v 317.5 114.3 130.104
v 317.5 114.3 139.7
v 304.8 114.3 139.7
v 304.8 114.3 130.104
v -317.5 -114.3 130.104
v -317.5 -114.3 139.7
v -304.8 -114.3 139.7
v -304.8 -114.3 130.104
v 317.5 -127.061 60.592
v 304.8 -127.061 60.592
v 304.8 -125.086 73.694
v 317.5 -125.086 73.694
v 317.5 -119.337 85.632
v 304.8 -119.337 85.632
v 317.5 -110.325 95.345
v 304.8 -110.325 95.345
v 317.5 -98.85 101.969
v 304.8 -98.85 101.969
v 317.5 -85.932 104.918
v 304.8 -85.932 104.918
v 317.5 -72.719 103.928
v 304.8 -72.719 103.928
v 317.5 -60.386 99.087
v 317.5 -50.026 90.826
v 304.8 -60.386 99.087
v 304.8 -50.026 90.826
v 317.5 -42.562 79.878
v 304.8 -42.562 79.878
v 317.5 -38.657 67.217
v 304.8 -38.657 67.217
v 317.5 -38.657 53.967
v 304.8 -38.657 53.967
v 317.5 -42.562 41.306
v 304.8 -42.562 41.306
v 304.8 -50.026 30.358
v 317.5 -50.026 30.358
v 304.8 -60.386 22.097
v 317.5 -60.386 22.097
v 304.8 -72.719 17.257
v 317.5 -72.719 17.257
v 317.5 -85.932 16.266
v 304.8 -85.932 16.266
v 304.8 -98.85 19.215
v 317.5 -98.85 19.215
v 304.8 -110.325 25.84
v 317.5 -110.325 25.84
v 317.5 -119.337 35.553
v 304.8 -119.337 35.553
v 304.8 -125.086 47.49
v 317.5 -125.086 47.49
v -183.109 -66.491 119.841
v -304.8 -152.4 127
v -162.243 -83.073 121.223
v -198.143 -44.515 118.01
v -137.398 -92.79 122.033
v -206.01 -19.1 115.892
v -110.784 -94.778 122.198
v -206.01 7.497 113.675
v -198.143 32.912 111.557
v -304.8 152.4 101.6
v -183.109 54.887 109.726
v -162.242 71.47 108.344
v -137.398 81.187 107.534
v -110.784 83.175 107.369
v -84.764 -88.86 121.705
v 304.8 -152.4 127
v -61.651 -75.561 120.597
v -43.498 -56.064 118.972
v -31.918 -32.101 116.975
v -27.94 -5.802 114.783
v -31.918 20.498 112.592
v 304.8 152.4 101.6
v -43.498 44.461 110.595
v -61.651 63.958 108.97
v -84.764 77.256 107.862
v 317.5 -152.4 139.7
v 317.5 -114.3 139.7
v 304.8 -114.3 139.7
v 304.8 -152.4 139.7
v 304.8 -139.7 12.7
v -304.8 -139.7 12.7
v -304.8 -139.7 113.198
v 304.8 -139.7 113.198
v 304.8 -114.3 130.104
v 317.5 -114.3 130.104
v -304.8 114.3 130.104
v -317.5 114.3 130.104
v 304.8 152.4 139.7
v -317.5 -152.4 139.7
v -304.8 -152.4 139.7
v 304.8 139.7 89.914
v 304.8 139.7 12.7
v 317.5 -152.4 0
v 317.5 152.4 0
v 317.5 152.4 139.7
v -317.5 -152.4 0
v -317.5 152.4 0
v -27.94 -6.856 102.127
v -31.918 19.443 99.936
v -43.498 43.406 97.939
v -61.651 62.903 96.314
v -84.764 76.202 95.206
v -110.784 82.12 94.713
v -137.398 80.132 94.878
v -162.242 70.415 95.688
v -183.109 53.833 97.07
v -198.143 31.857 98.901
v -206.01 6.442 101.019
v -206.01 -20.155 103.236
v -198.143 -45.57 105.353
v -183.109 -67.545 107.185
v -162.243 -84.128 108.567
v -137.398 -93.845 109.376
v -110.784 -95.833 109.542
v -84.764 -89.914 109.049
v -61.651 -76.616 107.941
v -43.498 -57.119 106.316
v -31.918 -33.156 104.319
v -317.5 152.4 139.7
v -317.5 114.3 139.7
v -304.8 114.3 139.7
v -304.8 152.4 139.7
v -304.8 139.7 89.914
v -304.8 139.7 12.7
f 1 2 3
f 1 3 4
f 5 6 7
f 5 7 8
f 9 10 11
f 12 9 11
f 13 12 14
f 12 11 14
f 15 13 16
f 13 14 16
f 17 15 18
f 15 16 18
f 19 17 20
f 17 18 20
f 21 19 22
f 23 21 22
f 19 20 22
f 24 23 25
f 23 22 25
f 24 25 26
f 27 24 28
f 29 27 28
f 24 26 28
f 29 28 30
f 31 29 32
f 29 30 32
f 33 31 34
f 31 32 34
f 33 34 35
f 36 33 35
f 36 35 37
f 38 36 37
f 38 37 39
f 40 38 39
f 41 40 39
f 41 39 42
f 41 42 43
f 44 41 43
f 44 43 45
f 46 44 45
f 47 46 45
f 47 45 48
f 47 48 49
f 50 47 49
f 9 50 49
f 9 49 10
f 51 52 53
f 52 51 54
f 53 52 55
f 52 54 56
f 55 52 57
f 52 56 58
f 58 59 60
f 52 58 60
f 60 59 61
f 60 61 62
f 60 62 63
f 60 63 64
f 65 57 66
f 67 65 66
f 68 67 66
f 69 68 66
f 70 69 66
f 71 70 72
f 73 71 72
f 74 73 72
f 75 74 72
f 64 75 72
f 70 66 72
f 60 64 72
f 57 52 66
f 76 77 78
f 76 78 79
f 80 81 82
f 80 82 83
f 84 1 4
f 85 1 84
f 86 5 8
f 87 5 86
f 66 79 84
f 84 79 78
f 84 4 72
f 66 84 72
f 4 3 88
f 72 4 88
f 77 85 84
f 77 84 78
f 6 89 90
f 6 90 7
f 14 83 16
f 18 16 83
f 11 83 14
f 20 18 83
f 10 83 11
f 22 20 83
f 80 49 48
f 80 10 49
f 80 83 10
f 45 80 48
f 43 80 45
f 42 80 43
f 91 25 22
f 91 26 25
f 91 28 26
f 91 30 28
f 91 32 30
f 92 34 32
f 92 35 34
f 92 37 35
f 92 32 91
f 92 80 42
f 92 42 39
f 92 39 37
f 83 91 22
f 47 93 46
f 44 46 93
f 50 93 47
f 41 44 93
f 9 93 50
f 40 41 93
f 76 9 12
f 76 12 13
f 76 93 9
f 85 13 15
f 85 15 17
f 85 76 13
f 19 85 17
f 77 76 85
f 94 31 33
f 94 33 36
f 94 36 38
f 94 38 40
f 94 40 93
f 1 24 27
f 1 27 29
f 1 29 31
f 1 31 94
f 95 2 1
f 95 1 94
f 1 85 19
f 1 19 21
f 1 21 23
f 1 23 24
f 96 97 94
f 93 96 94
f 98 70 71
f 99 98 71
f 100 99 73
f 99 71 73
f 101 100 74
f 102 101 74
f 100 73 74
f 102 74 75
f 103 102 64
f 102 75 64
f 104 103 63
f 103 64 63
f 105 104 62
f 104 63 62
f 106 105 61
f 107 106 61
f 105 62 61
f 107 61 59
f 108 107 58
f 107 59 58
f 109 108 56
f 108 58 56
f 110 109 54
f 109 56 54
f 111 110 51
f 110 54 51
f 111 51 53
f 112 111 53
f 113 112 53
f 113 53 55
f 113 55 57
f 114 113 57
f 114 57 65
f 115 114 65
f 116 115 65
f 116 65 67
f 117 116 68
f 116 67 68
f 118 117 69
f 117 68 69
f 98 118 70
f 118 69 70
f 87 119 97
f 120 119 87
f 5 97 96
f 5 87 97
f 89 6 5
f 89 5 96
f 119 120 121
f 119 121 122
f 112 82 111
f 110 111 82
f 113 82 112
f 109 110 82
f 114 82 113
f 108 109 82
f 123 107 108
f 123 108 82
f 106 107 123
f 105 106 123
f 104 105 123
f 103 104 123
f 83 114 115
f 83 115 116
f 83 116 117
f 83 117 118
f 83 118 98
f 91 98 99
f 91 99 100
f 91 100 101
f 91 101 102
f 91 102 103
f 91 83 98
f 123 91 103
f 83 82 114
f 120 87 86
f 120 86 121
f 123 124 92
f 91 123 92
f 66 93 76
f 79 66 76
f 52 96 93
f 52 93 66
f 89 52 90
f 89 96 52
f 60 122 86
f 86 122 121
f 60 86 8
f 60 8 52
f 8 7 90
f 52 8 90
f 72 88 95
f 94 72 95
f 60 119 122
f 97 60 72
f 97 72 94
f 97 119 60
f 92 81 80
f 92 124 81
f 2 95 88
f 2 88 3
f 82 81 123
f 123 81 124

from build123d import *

# Parameters (mm, degrees)
F0_W      = 635
F0_H      = 304.8
F1_DEPTH  = 127
F3_DEPTH  = 635.001
F4_T      = -12.7
F5_R      = 89.535
F6_DEPTH  = 12.7
F8_D      = 88.9
F8_DEPTH  = 25.4
F8_TIP    = 26.7082545158
F10_DEPTH = 12.7
F12_DEPTH = 12.7


with BuildPart() as f1:
    # F0 (on Top) → F1 (new body)
    with BuildSketch(Plane.XY):
        Rectangle(F0_W, F0_H)
    extrude(amount=F1_DEPTH)

    # F2 (on face) → F3 (cut, through all)
    with BuildSketch(Plane.YZ.offset(317.5)):
        Polygon((-152.4, 127), (152.4, 101.6), (152.4, 127), align=None)
    extrude(amount=-F3_DEPTH, mode=Mode.SUBTRACT)

    # F4 (hollow: no face is removed)
    offset(amount=F4_T, mode=Mode.SUBTRACT)

    # F5 (on face) → F6 (cut, through all)
    with BuildSketch(Plane(origin=(0, 9.4593103448, 113.5117241379), x_dir=(1, 0, 0), z_dir=(0, 0.0830454799, 0.9965457582))):
        with Locations((-117.475, -15.3138471966)):
            Circle(F5_R)
    extrude(amount=-F6_DEPTH, mode=Mode.SUBTRACT)

    # F8
    with Locations(Plane.YZ.offset(317.5)):
        with Locations((-82.6105548445, 60.5921064519)):
            Hole(F8_D / 2, depth=F8_DEPTH)
            with Locations((0, 0, -(F8_DEPTH + F8_TIP / 2))):  # 118° drill point
                Cone(0, F8_D / 2, F8_TIP, mode=Mode.SUBTRACT)

    # F9 (on face) → F10 (join)
    with BuildSketch(Plane.YZ.offset(317.5)):
        Polygon((-152.4, 139.7), (-152.4, 127), (152.4, 101.6), (152.4, 139.7), (114.3, 139.7), (114.3, 130.104392767), (-114.3, 130.104392767), (-114.3, 139.7), align=None)
    extrude(amount=-F10_DEPTH)

    # F11 (on face) → F12 (join)
    with BuildSketch(Plane(origin=(-317.5, 0, 0), x_dir=(0, -1, 0), z_dir=(-1, 0, 0))):
        Polygon((-152.4, 139.7), (-152.4, 101.6), (152.4, 127), (152.4, 139.7), (114.3, 139.7), (114.3, 130.104392767), (-114.3, 130.104392767), (-114.3, 139.7), align=None)
    extrude(amount=-F12_DEPTH)


solid = f1.part
